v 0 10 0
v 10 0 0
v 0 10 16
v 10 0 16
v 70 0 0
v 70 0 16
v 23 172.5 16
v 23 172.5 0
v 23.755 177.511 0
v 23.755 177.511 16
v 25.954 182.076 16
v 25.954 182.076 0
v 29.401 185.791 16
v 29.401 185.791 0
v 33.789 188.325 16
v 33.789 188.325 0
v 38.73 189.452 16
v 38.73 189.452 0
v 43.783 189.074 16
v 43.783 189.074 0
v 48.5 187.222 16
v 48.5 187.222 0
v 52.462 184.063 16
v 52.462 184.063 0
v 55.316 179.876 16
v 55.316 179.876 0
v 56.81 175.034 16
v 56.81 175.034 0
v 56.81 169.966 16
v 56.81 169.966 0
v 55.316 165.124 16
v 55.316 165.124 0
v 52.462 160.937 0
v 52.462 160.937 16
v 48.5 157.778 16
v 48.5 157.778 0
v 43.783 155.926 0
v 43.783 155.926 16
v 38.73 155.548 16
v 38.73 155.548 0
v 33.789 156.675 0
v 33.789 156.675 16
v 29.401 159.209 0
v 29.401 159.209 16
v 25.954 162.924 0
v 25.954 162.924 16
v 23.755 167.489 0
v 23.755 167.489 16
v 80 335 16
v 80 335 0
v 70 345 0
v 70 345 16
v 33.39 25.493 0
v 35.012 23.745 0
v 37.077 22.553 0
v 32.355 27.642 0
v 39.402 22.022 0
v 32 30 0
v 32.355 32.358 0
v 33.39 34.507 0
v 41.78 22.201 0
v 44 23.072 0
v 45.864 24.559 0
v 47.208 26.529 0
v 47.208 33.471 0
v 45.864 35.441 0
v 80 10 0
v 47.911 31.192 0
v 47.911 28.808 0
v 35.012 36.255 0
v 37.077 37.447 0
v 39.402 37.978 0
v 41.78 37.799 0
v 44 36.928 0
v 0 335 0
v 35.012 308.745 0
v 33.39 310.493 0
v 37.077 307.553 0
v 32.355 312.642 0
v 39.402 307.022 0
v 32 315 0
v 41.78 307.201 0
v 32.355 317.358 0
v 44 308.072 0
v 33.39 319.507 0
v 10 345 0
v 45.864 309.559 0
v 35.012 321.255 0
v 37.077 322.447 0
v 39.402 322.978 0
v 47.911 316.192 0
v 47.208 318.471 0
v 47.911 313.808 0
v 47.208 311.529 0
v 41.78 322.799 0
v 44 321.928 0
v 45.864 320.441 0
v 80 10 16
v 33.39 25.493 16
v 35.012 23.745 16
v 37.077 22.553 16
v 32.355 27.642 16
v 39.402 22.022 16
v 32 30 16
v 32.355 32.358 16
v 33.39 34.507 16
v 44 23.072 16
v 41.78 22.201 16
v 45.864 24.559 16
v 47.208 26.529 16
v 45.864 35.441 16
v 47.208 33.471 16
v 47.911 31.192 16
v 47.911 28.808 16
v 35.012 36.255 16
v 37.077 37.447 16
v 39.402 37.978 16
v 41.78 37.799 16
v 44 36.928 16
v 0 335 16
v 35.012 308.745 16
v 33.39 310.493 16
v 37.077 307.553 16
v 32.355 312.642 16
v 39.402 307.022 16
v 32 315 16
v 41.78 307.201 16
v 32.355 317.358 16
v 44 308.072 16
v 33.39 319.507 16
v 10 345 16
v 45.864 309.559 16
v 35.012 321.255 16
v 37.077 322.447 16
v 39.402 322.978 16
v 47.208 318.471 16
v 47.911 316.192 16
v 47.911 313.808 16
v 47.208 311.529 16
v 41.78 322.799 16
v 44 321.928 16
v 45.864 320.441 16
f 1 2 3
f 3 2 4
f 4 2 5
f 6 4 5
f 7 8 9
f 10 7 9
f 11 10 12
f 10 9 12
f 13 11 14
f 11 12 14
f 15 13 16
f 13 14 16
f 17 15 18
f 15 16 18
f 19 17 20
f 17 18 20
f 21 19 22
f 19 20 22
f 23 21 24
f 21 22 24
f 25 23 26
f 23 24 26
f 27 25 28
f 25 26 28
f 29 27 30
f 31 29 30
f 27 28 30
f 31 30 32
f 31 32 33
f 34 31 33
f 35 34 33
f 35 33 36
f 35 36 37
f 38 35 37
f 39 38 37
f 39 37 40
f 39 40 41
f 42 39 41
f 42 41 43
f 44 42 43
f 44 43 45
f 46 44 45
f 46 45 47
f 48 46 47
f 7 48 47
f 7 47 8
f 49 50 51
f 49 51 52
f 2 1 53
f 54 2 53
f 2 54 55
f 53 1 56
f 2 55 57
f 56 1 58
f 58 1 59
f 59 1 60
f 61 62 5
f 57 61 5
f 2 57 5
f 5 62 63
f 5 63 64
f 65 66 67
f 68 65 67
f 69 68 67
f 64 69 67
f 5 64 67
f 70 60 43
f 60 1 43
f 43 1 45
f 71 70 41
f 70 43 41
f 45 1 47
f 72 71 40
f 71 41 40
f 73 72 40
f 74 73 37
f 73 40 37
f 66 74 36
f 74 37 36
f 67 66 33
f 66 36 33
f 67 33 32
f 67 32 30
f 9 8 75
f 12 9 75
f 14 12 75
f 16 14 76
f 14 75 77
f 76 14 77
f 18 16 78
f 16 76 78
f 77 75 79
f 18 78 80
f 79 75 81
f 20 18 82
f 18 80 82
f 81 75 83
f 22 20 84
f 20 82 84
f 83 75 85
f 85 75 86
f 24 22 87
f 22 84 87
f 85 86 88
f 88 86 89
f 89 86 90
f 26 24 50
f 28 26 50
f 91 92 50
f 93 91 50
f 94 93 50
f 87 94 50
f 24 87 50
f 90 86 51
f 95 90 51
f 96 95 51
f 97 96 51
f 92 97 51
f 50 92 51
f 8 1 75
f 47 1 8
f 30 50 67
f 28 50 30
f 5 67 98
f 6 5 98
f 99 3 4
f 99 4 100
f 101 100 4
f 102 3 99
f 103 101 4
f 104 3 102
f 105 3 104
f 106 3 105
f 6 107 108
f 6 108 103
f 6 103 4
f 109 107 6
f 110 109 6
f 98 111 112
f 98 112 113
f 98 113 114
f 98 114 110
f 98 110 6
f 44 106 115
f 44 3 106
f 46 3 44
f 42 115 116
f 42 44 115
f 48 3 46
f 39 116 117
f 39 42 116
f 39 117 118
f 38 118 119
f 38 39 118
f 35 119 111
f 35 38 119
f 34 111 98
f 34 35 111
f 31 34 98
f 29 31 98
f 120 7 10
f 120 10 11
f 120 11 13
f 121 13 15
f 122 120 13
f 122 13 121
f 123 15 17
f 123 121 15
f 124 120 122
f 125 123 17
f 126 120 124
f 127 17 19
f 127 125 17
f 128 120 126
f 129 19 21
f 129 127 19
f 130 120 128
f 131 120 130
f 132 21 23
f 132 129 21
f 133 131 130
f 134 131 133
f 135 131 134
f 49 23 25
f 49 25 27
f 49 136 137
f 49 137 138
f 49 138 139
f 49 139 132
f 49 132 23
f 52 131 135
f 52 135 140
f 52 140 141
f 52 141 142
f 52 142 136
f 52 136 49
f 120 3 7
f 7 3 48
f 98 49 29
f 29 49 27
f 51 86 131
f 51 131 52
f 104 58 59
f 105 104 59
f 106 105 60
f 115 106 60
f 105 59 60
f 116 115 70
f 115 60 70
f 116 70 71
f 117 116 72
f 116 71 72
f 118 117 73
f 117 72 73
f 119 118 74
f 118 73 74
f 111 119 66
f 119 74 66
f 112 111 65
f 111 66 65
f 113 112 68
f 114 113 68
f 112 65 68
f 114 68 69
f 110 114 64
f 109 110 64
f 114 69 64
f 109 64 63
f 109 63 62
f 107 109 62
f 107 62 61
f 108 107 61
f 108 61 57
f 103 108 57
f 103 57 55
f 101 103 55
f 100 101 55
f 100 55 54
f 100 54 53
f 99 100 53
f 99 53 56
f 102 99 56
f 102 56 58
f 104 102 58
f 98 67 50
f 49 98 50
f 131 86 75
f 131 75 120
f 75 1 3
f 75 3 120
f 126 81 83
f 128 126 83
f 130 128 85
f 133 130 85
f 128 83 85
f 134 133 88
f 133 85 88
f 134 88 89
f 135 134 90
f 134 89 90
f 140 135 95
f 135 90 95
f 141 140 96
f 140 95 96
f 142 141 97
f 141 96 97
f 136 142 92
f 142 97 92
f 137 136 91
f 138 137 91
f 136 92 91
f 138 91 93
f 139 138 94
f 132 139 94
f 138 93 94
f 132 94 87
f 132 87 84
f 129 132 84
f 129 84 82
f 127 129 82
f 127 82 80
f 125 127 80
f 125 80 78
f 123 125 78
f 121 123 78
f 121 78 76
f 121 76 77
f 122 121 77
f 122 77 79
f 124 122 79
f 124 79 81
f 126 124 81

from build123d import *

# Parameters (mm, degrees)
SKETCH_1_W                  = 80
SKETCH_1_H                  = 345
EXTRUDE_1_DEPTH             = 16
HOLE_WIZARD_16_0_16_1_D     = 16
HOLE_WIZARD_16_0_16_1_DEPTH = 38
HOLE_WIZARD_16_0_16_1_TIP   = 4.806884952
CHAMFER_1_SIZE              = 10
HOLE_WIZARD_16_0_16_2_D     = 34


with BuildPart() as part:
    # 草图1 → 凸台-拉伸1 (new body)
    with BuildSketch(Plane.XY):
        with Locations((40, 172.5)):
            Rectangle(SKETCH_1_W, SKETCH_1_H)
    extrude(amount=EXTRUDE_1_DEPTH)

    # Ø16.0 (16) 直径孔1
    with Locations(Plane.XY.offset(16)):
        with Locations((40, 315), (40, 30)):
            Hole(HOLE_WIZARD_16_0_16_1_D / 2, depth=HOLE_WIZARD_16_0_16_1_DEPTH)
            with Locations((0, 0, -(HOLE_WIZARD_16_0_16_1_DEPTH + HOLE_WIZARD_16_0_16_1_TIP / 2))):  # 118° drill point
                Cone(0, HOLE_WIZARD_16_0_16_1_D / 2, HOLE_WIZARD_16_0_16_1_TIP, mode=Mode.SUBTRACT)

    # 倒角1
    chamfer_1_edges = [part.edges().sort_by_distance(p)[0] for p in [
        (0, 345, 8),
        (80, 345, 8),
        (80, 0, 8),
        (0, 0, 8),
    ]]
    chamfer(chamfer_1_edges, length=CHAMFER_1_SIZE)

    # Ø16.0 (16) 直径孔2 (through all)
    with Locations(Plane.XY.offset(16)):
        with Locations((40, 172.5)):
            Hole(HOLE_WIZARD_16_0_16_2_D / 2)


solid = part.part
